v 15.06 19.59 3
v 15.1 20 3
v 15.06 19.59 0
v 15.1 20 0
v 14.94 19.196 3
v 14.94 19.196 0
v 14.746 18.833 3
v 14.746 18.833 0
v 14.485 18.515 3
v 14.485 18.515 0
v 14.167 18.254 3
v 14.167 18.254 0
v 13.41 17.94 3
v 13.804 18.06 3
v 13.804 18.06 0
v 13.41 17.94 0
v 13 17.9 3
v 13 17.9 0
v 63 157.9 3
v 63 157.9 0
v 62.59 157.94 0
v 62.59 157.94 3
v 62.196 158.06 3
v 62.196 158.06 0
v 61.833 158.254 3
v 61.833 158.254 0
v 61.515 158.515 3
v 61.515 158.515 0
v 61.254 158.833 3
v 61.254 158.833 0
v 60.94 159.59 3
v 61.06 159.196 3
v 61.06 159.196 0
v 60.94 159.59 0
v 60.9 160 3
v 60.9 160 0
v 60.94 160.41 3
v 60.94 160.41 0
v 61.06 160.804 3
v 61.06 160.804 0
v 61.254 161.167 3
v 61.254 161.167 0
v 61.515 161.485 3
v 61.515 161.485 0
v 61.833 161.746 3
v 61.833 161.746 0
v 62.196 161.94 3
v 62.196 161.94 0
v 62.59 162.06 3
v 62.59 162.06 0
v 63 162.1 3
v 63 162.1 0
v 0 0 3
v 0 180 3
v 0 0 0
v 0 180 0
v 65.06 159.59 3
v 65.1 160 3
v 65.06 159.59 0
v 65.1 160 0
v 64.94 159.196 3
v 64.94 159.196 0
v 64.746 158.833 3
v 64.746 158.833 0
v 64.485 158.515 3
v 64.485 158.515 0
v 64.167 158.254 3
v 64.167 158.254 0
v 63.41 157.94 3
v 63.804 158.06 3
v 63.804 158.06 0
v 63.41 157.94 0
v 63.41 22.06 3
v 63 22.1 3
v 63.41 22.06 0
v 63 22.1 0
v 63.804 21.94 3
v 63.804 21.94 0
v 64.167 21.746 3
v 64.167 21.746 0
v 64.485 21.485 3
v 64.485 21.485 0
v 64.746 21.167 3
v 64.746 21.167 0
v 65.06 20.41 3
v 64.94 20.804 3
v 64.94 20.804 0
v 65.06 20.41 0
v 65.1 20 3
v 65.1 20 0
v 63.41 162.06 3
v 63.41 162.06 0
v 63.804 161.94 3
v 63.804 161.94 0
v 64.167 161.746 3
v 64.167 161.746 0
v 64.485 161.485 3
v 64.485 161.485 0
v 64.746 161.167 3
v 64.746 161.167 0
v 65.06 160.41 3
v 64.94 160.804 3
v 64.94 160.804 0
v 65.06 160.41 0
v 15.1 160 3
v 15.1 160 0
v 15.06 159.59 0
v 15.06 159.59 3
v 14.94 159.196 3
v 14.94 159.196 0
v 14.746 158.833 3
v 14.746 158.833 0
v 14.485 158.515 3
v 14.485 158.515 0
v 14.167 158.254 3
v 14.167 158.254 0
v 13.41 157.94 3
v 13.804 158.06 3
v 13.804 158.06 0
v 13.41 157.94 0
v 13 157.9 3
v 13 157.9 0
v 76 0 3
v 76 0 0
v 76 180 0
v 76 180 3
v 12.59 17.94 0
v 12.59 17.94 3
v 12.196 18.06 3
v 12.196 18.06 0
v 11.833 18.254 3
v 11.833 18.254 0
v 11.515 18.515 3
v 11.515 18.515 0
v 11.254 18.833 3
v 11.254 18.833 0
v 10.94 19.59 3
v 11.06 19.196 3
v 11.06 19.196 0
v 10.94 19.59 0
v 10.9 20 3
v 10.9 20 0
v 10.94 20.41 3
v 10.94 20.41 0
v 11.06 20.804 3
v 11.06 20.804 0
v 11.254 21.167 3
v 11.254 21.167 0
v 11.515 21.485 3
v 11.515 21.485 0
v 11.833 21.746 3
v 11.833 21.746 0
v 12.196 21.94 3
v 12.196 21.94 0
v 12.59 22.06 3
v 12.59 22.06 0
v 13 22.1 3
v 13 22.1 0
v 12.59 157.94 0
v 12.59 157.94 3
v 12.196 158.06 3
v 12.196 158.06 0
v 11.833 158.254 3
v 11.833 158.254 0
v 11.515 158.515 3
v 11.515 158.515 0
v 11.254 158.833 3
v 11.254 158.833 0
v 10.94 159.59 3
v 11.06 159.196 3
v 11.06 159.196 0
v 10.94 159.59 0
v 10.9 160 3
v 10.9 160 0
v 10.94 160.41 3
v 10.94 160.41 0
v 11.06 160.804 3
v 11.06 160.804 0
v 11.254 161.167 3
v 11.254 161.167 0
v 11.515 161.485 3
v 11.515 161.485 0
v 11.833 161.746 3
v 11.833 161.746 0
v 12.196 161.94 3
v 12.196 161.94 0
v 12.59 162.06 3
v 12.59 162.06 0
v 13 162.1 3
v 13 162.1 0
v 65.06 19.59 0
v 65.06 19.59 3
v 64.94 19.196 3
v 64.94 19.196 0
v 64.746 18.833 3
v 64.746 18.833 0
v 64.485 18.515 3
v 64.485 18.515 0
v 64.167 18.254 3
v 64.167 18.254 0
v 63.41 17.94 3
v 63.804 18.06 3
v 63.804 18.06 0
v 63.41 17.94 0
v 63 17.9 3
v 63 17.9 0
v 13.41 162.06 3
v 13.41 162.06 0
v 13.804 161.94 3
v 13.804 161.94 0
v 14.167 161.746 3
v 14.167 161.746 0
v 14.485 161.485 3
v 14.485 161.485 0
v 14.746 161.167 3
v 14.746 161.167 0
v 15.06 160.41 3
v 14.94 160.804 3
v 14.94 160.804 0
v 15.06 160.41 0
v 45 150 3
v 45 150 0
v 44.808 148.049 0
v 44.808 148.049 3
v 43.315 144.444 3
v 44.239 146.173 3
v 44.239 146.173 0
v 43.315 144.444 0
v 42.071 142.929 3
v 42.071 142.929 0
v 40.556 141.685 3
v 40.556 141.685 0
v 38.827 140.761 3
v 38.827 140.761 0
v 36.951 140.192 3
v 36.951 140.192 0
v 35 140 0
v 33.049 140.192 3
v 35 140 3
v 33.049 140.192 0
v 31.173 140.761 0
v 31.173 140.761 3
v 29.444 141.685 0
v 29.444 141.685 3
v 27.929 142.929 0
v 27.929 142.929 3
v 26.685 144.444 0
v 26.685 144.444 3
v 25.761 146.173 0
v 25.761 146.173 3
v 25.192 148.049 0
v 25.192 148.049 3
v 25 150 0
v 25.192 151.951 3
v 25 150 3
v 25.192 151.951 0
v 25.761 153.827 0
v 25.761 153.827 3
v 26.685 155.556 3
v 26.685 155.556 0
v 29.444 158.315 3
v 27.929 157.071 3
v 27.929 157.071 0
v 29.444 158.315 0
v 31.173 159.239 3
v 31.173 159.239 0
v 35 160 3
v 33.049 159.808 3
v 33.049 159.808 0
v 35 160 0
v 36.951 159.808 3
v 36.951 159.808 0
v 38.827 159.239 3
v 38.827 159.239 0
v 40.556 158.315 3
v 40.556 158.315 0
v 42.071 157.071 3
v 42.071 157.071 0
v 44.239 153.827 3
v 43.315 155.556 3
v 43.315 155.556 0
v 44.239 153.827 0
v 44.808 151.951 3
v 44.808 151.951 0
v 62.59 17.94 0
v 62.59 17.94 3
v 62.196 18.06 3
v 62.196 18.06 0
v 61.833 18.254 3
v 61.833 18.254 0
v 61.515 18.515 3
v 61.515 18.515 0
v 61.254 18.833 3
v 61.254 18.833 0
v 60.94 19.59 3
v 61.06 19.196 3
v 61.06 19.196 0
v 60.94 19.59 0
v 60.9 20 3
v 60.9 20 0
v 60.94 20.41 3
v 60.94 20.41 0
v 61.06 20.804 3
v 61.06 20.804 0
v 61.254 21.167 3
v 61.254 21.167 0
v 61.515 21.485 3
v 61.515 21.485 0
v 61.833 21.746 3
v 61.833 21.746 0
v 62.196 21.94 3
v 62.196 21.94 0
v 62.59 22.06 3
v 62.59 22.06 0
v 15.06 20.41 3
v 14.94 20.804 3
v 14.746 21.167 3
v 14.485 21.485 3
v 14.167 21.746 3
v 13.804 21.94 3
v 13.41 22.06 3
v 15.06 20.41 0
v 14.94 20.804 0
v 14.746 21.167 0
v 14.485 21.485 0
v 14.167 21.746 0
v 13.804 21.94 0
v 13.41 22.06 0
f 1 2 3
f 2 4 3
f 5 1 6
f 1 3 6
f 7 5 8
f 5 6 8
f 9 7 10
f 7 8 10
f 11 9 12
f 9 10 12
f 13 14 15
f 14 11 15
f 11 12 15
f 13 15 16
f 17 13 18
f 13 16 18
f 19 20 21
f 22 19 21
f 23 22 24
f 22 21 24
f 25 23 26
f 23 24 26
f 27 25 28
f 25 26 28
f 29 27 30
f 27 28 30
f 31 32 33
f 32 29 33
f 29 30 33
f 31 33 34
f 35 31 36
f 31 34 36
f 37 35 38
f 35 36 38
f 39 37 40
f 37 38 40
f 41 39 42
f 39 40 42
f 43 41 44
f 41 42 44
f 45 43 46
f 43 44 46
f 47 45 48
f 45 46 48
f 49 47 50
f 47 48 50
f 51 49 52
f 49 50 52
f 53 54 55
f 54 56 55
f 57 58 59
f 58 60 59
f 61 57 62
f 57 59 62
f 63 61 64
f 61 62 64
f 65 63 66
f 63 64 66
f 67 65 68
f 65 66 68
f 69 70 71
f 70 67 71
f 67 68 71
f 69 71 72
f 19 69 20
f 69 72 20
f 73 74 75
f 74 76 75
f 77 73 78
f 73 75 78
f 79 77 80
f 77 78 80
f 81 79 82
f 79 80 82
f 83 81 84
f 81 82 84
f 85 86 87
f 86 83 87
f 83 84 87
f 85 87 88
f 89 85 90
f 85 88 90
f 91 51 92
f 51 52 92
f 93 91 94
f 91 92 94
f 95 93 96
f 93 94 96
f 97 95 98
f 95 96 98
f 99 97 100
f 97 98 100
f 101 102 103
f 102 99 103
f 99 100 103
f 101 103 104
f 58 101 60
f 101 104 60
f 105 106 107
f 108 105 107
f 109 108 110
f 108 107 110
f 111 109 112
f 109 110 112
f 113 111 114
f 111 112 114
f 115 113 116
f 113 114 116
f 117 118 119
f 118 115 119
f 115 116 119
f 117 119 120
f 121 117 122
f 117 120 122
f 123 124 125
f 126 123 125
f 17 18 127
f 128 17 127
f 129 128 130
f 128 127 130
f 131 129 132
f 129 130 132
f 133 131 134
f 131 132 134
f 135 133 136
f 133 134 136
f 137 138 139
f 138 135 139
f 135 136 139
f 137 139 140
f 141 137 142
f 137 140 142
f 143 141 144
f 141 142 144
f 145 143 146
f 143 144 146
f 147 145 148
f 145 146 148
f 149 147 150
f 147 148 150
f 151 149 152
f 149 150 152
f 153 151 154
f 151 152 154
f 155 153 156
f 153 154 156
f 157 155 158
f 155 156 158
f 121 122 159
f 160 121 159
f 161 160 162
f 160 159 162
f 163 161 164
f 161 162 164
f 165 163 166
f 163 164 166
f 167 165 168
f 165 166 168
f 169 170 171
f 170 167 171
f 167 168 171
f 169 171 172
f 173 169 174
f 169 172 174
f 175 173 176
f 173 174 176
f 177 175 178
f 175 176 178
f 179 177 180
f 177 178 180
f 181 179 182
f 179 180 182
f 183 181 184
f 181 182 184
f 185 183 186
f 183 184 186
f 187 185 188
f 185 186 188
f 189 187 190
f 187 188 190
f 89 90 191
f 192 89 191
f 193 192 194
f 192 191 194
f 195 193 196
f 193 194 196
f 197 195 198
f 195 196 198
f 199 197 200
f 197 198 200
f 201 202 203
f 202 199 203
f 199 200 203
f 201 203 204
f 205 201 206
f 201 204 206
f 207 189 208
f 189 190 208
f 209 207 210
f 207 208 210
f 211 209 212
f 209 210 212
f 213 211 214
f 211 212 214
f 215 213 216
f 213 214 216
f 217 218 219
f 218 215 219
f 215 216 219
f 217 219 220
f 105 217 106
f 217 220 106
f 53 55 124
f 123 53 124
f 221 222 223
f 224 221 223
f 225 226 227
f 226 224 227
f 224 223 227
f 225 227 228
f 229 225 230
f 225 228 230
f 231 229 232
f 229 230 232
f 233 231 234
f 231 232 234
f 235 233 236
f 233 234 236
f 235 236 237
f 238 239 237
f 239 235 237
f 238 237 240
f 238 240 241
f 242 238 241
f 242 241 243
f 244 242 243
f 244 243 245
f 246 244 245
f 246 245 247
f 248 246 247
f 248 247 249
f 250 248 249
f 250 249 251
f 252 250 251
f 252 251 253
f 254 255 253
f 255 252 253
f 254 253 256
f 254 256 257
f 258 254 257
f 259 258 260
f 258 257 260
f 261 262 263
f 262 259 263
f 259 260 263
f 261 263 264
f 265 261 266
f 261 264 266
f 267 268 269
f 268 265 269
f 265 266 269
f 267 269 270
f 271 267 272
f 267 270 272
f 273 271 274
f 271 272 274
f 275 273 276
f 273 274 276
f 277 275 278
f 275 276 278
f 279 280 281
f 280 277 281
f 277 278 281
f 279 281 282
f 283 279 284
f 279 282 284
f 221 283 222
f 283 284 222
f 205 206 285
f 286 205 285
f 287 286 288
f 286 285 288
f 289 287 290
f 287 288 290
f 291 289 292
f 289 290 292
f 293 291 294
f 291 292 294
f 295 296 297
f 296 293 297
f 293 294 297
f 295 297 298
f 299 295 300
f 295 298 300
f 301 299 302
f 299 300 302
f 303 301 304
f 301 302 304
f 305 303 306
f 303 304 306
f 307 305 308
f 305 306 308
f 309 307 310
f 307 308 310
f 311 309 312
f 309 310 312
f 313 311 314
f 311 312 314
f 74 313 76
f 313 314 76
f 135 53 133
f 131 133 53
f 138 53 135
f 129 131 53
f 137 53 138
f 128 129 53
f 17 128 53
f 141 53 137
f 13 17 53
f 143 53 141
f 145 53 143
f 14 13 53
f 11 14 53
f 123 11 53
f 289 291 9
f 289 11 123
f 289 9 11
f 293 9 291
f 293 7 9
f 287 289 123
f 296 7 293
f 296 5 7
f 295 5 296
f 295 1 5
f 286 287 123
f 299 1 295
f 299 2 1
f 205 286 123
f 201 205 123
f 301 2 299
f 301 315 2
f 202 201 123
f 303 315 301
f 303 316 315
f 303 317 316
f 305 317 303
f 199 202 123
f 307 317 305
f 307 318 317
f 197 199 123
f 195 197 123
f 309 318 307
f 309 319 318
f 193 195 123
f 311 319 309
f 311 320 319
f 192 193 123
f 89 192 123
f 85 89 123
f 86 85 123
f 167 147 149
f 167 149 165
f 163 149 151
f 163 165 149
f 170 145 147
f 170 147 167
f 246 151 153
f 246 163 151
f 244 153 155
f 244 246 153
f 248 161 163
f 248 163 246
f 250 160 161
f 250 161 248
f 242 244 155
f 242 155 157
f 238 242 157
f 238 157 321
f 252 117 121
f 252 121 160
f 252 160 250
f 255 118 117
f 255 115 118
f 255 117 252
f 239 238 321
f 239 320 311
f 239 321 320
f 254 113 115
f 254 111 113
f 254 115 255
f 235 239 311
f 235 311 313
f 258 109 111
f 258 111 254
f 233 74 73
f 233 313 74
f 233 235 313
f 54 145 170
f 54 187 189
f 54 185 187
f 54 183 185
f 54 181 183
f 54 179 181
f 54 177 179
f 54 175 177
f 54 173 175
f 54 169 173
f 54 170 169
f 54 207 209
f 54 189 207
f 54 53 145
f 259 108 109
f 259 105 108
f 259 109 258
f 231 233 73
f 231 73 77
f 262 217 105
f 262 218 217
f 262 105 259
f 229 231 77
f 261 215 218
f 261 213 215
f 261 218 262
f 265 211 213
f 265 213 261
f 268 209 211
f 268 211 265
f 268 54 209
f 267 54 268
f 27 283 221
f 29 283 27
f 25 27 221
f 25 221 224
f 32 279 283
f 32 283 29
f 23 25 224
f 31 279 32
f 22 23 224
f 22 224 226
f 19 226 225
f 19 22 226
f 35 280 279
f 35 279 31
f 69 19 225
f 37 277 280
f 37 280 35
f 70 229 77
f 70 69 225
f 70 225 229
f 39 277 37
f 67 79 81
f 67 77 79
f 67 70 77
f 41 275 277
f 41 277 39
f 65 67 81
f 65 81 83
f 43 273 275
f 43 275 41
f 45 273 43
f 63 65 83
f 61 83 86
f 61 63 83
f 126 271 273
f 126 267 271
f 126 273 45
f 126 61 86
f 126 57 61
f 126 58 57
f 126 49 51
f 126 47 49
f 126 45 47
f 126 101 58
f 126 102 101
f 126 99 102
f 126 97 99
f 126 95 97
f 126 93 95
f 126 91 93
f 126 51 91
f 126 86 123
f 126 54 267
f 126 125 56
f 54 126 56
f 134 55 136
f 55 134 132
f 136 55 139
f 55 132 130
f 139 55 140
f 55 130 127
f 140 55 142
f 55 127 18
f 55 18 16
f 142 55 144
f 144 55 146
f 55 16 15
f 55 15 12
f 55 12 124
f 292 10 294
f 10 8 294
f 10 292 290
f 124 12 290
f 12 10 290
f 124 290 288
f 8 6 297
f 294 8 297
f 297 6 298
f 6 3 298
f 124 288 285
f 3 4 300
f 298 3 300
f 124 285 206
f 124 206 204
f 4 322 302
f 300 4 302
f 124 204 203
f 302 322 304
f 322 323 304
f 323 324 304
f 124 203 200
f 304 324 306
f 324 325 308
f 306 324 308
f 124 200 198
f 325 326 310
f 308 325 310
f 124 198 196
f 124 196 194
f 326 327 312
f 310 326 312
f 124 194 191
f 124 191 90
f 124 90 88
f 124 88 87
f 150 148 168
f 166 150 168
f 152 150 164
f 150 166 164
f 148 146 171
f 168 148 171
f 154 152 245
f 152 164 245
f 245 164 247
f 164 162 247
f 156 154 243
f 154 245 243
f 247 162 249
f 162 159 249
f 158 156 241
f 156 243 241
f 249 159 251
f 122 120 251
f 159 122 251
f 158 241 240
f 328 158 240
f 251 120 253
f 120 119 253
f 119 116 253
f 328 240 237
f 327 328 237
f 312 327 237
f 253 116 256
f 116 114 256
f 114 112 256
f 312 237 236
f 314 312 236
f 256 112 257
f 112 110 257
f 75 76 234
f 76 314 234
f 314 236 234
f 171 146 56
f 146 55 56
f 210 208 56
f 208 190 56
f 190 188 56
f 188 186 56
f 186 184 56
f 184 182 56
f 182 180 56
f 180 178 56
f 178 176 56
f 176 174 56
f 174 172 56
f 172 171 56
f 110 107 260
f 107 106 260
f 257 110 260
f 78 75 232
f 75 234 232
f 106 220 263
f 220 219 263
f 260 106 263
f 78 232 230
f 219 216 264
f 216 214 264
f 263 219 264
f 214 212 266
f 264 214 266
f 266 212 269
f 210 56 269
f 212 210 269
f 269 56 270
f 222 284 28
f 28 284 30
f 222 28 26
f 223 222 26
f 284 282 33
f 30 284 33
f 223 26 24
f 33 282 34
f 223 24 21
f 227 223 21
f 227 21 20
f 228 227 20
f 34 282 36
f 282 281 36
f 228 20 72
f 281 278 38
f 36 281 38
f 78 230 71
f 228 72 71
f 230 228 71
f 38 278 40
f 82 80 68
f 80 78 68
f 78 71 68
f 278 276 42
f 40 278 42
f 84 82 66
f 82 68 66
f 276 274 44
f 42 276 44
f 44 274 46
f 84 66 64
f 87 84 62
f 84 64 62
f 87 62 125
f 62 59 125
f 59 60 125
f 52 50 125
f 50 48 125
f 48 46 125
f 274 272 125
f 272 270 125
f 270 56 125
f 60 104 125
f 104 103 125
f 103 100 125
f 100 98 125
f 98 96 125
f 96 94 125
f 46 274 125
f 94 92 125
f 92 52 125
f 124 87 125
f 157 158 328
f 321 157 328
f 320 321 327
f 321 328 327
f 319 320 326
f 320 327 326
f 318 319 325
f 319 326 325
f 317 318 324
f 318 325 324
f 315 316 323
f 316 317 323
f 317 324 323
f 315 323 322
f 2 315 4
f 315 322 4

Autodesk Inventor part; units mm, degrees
ref_plane "YZ Plane" through (0, 0, 0) normal (1, 0, 0) x (0, 1, 0)
ref_plane "XZ Plane" through (0, 0, 0) normal (0, 1, 0) x (-1, 0, 0)
ref_plane "XY Plane" through (0, 0, 0) normal (0, 0, 1) x (1, 0, 0)
sketch "Sketch1" plane through (0, 0, 0) normal (0, 0, 1) x (1, 0, 0)
  line L0 (76, 0) -> (76, 180)
  line L1 (0, 180) -> (0, 0)
  line L2 (76, 180) -> (0, 180)
  circle A0 centre (35, 150) radius 10
  line L3 (0, 0) -> (76, 0)
  line L4 (13, 169.7925) -> (13, 8.2181)
  line L5 (63, 169.7925) -> (63, 4.1511)
  circle A1 centre (13, 160) radius 2.1
  circle A2 centre (63, 160) radius 2.1
  circle A3 centre (13, 20) radius 2.1
  circle A4 centre (63, 20) radius 2.1
  point P0 (63, 22.1)
  point P1 (63, 17.9)
  point P2 (13, 22.1)
  point P3 (13, 17.9)
  point P4 (63, 162.1)
  point P5 (63, 157.9)
  point P6 (13, 162.1)
  point P7 (13, 157.9)
  dimension "d1" = 180
  dimension "d26" = 20
  dimension "d27" = 35
  dimension "d28" = 30
  dimension "d29" = 180
  dimension "d30" = 13
  dimension "d31" = 13
  dimension "d32" = 4.2
  dimension "d33" = 4.2
  dimension "d34" = 20
  dimension "d35" = 20
  dimension "d36" = 4.2
  dimension "d37" = 4.2
  dimension "d38" = 20
  dimension "d39" = 20
  dimension "d40" = 76
extrude "Extrusion1" add sketch "Sketch1" along normal blind 3
equation "\"d27\" = 0.5 * d0"
equation "\"d31\" = d30"
equation "\"d33\" = d32"
equation "\"d35\" = d34"
equation "\"d36\" = d33"
equation "\"d37\" = d36"
equation "\"d38\" = d39"
equation "\"d0\" = 70"
properties part number "BaseC_4" material "PMMA Plastic"
